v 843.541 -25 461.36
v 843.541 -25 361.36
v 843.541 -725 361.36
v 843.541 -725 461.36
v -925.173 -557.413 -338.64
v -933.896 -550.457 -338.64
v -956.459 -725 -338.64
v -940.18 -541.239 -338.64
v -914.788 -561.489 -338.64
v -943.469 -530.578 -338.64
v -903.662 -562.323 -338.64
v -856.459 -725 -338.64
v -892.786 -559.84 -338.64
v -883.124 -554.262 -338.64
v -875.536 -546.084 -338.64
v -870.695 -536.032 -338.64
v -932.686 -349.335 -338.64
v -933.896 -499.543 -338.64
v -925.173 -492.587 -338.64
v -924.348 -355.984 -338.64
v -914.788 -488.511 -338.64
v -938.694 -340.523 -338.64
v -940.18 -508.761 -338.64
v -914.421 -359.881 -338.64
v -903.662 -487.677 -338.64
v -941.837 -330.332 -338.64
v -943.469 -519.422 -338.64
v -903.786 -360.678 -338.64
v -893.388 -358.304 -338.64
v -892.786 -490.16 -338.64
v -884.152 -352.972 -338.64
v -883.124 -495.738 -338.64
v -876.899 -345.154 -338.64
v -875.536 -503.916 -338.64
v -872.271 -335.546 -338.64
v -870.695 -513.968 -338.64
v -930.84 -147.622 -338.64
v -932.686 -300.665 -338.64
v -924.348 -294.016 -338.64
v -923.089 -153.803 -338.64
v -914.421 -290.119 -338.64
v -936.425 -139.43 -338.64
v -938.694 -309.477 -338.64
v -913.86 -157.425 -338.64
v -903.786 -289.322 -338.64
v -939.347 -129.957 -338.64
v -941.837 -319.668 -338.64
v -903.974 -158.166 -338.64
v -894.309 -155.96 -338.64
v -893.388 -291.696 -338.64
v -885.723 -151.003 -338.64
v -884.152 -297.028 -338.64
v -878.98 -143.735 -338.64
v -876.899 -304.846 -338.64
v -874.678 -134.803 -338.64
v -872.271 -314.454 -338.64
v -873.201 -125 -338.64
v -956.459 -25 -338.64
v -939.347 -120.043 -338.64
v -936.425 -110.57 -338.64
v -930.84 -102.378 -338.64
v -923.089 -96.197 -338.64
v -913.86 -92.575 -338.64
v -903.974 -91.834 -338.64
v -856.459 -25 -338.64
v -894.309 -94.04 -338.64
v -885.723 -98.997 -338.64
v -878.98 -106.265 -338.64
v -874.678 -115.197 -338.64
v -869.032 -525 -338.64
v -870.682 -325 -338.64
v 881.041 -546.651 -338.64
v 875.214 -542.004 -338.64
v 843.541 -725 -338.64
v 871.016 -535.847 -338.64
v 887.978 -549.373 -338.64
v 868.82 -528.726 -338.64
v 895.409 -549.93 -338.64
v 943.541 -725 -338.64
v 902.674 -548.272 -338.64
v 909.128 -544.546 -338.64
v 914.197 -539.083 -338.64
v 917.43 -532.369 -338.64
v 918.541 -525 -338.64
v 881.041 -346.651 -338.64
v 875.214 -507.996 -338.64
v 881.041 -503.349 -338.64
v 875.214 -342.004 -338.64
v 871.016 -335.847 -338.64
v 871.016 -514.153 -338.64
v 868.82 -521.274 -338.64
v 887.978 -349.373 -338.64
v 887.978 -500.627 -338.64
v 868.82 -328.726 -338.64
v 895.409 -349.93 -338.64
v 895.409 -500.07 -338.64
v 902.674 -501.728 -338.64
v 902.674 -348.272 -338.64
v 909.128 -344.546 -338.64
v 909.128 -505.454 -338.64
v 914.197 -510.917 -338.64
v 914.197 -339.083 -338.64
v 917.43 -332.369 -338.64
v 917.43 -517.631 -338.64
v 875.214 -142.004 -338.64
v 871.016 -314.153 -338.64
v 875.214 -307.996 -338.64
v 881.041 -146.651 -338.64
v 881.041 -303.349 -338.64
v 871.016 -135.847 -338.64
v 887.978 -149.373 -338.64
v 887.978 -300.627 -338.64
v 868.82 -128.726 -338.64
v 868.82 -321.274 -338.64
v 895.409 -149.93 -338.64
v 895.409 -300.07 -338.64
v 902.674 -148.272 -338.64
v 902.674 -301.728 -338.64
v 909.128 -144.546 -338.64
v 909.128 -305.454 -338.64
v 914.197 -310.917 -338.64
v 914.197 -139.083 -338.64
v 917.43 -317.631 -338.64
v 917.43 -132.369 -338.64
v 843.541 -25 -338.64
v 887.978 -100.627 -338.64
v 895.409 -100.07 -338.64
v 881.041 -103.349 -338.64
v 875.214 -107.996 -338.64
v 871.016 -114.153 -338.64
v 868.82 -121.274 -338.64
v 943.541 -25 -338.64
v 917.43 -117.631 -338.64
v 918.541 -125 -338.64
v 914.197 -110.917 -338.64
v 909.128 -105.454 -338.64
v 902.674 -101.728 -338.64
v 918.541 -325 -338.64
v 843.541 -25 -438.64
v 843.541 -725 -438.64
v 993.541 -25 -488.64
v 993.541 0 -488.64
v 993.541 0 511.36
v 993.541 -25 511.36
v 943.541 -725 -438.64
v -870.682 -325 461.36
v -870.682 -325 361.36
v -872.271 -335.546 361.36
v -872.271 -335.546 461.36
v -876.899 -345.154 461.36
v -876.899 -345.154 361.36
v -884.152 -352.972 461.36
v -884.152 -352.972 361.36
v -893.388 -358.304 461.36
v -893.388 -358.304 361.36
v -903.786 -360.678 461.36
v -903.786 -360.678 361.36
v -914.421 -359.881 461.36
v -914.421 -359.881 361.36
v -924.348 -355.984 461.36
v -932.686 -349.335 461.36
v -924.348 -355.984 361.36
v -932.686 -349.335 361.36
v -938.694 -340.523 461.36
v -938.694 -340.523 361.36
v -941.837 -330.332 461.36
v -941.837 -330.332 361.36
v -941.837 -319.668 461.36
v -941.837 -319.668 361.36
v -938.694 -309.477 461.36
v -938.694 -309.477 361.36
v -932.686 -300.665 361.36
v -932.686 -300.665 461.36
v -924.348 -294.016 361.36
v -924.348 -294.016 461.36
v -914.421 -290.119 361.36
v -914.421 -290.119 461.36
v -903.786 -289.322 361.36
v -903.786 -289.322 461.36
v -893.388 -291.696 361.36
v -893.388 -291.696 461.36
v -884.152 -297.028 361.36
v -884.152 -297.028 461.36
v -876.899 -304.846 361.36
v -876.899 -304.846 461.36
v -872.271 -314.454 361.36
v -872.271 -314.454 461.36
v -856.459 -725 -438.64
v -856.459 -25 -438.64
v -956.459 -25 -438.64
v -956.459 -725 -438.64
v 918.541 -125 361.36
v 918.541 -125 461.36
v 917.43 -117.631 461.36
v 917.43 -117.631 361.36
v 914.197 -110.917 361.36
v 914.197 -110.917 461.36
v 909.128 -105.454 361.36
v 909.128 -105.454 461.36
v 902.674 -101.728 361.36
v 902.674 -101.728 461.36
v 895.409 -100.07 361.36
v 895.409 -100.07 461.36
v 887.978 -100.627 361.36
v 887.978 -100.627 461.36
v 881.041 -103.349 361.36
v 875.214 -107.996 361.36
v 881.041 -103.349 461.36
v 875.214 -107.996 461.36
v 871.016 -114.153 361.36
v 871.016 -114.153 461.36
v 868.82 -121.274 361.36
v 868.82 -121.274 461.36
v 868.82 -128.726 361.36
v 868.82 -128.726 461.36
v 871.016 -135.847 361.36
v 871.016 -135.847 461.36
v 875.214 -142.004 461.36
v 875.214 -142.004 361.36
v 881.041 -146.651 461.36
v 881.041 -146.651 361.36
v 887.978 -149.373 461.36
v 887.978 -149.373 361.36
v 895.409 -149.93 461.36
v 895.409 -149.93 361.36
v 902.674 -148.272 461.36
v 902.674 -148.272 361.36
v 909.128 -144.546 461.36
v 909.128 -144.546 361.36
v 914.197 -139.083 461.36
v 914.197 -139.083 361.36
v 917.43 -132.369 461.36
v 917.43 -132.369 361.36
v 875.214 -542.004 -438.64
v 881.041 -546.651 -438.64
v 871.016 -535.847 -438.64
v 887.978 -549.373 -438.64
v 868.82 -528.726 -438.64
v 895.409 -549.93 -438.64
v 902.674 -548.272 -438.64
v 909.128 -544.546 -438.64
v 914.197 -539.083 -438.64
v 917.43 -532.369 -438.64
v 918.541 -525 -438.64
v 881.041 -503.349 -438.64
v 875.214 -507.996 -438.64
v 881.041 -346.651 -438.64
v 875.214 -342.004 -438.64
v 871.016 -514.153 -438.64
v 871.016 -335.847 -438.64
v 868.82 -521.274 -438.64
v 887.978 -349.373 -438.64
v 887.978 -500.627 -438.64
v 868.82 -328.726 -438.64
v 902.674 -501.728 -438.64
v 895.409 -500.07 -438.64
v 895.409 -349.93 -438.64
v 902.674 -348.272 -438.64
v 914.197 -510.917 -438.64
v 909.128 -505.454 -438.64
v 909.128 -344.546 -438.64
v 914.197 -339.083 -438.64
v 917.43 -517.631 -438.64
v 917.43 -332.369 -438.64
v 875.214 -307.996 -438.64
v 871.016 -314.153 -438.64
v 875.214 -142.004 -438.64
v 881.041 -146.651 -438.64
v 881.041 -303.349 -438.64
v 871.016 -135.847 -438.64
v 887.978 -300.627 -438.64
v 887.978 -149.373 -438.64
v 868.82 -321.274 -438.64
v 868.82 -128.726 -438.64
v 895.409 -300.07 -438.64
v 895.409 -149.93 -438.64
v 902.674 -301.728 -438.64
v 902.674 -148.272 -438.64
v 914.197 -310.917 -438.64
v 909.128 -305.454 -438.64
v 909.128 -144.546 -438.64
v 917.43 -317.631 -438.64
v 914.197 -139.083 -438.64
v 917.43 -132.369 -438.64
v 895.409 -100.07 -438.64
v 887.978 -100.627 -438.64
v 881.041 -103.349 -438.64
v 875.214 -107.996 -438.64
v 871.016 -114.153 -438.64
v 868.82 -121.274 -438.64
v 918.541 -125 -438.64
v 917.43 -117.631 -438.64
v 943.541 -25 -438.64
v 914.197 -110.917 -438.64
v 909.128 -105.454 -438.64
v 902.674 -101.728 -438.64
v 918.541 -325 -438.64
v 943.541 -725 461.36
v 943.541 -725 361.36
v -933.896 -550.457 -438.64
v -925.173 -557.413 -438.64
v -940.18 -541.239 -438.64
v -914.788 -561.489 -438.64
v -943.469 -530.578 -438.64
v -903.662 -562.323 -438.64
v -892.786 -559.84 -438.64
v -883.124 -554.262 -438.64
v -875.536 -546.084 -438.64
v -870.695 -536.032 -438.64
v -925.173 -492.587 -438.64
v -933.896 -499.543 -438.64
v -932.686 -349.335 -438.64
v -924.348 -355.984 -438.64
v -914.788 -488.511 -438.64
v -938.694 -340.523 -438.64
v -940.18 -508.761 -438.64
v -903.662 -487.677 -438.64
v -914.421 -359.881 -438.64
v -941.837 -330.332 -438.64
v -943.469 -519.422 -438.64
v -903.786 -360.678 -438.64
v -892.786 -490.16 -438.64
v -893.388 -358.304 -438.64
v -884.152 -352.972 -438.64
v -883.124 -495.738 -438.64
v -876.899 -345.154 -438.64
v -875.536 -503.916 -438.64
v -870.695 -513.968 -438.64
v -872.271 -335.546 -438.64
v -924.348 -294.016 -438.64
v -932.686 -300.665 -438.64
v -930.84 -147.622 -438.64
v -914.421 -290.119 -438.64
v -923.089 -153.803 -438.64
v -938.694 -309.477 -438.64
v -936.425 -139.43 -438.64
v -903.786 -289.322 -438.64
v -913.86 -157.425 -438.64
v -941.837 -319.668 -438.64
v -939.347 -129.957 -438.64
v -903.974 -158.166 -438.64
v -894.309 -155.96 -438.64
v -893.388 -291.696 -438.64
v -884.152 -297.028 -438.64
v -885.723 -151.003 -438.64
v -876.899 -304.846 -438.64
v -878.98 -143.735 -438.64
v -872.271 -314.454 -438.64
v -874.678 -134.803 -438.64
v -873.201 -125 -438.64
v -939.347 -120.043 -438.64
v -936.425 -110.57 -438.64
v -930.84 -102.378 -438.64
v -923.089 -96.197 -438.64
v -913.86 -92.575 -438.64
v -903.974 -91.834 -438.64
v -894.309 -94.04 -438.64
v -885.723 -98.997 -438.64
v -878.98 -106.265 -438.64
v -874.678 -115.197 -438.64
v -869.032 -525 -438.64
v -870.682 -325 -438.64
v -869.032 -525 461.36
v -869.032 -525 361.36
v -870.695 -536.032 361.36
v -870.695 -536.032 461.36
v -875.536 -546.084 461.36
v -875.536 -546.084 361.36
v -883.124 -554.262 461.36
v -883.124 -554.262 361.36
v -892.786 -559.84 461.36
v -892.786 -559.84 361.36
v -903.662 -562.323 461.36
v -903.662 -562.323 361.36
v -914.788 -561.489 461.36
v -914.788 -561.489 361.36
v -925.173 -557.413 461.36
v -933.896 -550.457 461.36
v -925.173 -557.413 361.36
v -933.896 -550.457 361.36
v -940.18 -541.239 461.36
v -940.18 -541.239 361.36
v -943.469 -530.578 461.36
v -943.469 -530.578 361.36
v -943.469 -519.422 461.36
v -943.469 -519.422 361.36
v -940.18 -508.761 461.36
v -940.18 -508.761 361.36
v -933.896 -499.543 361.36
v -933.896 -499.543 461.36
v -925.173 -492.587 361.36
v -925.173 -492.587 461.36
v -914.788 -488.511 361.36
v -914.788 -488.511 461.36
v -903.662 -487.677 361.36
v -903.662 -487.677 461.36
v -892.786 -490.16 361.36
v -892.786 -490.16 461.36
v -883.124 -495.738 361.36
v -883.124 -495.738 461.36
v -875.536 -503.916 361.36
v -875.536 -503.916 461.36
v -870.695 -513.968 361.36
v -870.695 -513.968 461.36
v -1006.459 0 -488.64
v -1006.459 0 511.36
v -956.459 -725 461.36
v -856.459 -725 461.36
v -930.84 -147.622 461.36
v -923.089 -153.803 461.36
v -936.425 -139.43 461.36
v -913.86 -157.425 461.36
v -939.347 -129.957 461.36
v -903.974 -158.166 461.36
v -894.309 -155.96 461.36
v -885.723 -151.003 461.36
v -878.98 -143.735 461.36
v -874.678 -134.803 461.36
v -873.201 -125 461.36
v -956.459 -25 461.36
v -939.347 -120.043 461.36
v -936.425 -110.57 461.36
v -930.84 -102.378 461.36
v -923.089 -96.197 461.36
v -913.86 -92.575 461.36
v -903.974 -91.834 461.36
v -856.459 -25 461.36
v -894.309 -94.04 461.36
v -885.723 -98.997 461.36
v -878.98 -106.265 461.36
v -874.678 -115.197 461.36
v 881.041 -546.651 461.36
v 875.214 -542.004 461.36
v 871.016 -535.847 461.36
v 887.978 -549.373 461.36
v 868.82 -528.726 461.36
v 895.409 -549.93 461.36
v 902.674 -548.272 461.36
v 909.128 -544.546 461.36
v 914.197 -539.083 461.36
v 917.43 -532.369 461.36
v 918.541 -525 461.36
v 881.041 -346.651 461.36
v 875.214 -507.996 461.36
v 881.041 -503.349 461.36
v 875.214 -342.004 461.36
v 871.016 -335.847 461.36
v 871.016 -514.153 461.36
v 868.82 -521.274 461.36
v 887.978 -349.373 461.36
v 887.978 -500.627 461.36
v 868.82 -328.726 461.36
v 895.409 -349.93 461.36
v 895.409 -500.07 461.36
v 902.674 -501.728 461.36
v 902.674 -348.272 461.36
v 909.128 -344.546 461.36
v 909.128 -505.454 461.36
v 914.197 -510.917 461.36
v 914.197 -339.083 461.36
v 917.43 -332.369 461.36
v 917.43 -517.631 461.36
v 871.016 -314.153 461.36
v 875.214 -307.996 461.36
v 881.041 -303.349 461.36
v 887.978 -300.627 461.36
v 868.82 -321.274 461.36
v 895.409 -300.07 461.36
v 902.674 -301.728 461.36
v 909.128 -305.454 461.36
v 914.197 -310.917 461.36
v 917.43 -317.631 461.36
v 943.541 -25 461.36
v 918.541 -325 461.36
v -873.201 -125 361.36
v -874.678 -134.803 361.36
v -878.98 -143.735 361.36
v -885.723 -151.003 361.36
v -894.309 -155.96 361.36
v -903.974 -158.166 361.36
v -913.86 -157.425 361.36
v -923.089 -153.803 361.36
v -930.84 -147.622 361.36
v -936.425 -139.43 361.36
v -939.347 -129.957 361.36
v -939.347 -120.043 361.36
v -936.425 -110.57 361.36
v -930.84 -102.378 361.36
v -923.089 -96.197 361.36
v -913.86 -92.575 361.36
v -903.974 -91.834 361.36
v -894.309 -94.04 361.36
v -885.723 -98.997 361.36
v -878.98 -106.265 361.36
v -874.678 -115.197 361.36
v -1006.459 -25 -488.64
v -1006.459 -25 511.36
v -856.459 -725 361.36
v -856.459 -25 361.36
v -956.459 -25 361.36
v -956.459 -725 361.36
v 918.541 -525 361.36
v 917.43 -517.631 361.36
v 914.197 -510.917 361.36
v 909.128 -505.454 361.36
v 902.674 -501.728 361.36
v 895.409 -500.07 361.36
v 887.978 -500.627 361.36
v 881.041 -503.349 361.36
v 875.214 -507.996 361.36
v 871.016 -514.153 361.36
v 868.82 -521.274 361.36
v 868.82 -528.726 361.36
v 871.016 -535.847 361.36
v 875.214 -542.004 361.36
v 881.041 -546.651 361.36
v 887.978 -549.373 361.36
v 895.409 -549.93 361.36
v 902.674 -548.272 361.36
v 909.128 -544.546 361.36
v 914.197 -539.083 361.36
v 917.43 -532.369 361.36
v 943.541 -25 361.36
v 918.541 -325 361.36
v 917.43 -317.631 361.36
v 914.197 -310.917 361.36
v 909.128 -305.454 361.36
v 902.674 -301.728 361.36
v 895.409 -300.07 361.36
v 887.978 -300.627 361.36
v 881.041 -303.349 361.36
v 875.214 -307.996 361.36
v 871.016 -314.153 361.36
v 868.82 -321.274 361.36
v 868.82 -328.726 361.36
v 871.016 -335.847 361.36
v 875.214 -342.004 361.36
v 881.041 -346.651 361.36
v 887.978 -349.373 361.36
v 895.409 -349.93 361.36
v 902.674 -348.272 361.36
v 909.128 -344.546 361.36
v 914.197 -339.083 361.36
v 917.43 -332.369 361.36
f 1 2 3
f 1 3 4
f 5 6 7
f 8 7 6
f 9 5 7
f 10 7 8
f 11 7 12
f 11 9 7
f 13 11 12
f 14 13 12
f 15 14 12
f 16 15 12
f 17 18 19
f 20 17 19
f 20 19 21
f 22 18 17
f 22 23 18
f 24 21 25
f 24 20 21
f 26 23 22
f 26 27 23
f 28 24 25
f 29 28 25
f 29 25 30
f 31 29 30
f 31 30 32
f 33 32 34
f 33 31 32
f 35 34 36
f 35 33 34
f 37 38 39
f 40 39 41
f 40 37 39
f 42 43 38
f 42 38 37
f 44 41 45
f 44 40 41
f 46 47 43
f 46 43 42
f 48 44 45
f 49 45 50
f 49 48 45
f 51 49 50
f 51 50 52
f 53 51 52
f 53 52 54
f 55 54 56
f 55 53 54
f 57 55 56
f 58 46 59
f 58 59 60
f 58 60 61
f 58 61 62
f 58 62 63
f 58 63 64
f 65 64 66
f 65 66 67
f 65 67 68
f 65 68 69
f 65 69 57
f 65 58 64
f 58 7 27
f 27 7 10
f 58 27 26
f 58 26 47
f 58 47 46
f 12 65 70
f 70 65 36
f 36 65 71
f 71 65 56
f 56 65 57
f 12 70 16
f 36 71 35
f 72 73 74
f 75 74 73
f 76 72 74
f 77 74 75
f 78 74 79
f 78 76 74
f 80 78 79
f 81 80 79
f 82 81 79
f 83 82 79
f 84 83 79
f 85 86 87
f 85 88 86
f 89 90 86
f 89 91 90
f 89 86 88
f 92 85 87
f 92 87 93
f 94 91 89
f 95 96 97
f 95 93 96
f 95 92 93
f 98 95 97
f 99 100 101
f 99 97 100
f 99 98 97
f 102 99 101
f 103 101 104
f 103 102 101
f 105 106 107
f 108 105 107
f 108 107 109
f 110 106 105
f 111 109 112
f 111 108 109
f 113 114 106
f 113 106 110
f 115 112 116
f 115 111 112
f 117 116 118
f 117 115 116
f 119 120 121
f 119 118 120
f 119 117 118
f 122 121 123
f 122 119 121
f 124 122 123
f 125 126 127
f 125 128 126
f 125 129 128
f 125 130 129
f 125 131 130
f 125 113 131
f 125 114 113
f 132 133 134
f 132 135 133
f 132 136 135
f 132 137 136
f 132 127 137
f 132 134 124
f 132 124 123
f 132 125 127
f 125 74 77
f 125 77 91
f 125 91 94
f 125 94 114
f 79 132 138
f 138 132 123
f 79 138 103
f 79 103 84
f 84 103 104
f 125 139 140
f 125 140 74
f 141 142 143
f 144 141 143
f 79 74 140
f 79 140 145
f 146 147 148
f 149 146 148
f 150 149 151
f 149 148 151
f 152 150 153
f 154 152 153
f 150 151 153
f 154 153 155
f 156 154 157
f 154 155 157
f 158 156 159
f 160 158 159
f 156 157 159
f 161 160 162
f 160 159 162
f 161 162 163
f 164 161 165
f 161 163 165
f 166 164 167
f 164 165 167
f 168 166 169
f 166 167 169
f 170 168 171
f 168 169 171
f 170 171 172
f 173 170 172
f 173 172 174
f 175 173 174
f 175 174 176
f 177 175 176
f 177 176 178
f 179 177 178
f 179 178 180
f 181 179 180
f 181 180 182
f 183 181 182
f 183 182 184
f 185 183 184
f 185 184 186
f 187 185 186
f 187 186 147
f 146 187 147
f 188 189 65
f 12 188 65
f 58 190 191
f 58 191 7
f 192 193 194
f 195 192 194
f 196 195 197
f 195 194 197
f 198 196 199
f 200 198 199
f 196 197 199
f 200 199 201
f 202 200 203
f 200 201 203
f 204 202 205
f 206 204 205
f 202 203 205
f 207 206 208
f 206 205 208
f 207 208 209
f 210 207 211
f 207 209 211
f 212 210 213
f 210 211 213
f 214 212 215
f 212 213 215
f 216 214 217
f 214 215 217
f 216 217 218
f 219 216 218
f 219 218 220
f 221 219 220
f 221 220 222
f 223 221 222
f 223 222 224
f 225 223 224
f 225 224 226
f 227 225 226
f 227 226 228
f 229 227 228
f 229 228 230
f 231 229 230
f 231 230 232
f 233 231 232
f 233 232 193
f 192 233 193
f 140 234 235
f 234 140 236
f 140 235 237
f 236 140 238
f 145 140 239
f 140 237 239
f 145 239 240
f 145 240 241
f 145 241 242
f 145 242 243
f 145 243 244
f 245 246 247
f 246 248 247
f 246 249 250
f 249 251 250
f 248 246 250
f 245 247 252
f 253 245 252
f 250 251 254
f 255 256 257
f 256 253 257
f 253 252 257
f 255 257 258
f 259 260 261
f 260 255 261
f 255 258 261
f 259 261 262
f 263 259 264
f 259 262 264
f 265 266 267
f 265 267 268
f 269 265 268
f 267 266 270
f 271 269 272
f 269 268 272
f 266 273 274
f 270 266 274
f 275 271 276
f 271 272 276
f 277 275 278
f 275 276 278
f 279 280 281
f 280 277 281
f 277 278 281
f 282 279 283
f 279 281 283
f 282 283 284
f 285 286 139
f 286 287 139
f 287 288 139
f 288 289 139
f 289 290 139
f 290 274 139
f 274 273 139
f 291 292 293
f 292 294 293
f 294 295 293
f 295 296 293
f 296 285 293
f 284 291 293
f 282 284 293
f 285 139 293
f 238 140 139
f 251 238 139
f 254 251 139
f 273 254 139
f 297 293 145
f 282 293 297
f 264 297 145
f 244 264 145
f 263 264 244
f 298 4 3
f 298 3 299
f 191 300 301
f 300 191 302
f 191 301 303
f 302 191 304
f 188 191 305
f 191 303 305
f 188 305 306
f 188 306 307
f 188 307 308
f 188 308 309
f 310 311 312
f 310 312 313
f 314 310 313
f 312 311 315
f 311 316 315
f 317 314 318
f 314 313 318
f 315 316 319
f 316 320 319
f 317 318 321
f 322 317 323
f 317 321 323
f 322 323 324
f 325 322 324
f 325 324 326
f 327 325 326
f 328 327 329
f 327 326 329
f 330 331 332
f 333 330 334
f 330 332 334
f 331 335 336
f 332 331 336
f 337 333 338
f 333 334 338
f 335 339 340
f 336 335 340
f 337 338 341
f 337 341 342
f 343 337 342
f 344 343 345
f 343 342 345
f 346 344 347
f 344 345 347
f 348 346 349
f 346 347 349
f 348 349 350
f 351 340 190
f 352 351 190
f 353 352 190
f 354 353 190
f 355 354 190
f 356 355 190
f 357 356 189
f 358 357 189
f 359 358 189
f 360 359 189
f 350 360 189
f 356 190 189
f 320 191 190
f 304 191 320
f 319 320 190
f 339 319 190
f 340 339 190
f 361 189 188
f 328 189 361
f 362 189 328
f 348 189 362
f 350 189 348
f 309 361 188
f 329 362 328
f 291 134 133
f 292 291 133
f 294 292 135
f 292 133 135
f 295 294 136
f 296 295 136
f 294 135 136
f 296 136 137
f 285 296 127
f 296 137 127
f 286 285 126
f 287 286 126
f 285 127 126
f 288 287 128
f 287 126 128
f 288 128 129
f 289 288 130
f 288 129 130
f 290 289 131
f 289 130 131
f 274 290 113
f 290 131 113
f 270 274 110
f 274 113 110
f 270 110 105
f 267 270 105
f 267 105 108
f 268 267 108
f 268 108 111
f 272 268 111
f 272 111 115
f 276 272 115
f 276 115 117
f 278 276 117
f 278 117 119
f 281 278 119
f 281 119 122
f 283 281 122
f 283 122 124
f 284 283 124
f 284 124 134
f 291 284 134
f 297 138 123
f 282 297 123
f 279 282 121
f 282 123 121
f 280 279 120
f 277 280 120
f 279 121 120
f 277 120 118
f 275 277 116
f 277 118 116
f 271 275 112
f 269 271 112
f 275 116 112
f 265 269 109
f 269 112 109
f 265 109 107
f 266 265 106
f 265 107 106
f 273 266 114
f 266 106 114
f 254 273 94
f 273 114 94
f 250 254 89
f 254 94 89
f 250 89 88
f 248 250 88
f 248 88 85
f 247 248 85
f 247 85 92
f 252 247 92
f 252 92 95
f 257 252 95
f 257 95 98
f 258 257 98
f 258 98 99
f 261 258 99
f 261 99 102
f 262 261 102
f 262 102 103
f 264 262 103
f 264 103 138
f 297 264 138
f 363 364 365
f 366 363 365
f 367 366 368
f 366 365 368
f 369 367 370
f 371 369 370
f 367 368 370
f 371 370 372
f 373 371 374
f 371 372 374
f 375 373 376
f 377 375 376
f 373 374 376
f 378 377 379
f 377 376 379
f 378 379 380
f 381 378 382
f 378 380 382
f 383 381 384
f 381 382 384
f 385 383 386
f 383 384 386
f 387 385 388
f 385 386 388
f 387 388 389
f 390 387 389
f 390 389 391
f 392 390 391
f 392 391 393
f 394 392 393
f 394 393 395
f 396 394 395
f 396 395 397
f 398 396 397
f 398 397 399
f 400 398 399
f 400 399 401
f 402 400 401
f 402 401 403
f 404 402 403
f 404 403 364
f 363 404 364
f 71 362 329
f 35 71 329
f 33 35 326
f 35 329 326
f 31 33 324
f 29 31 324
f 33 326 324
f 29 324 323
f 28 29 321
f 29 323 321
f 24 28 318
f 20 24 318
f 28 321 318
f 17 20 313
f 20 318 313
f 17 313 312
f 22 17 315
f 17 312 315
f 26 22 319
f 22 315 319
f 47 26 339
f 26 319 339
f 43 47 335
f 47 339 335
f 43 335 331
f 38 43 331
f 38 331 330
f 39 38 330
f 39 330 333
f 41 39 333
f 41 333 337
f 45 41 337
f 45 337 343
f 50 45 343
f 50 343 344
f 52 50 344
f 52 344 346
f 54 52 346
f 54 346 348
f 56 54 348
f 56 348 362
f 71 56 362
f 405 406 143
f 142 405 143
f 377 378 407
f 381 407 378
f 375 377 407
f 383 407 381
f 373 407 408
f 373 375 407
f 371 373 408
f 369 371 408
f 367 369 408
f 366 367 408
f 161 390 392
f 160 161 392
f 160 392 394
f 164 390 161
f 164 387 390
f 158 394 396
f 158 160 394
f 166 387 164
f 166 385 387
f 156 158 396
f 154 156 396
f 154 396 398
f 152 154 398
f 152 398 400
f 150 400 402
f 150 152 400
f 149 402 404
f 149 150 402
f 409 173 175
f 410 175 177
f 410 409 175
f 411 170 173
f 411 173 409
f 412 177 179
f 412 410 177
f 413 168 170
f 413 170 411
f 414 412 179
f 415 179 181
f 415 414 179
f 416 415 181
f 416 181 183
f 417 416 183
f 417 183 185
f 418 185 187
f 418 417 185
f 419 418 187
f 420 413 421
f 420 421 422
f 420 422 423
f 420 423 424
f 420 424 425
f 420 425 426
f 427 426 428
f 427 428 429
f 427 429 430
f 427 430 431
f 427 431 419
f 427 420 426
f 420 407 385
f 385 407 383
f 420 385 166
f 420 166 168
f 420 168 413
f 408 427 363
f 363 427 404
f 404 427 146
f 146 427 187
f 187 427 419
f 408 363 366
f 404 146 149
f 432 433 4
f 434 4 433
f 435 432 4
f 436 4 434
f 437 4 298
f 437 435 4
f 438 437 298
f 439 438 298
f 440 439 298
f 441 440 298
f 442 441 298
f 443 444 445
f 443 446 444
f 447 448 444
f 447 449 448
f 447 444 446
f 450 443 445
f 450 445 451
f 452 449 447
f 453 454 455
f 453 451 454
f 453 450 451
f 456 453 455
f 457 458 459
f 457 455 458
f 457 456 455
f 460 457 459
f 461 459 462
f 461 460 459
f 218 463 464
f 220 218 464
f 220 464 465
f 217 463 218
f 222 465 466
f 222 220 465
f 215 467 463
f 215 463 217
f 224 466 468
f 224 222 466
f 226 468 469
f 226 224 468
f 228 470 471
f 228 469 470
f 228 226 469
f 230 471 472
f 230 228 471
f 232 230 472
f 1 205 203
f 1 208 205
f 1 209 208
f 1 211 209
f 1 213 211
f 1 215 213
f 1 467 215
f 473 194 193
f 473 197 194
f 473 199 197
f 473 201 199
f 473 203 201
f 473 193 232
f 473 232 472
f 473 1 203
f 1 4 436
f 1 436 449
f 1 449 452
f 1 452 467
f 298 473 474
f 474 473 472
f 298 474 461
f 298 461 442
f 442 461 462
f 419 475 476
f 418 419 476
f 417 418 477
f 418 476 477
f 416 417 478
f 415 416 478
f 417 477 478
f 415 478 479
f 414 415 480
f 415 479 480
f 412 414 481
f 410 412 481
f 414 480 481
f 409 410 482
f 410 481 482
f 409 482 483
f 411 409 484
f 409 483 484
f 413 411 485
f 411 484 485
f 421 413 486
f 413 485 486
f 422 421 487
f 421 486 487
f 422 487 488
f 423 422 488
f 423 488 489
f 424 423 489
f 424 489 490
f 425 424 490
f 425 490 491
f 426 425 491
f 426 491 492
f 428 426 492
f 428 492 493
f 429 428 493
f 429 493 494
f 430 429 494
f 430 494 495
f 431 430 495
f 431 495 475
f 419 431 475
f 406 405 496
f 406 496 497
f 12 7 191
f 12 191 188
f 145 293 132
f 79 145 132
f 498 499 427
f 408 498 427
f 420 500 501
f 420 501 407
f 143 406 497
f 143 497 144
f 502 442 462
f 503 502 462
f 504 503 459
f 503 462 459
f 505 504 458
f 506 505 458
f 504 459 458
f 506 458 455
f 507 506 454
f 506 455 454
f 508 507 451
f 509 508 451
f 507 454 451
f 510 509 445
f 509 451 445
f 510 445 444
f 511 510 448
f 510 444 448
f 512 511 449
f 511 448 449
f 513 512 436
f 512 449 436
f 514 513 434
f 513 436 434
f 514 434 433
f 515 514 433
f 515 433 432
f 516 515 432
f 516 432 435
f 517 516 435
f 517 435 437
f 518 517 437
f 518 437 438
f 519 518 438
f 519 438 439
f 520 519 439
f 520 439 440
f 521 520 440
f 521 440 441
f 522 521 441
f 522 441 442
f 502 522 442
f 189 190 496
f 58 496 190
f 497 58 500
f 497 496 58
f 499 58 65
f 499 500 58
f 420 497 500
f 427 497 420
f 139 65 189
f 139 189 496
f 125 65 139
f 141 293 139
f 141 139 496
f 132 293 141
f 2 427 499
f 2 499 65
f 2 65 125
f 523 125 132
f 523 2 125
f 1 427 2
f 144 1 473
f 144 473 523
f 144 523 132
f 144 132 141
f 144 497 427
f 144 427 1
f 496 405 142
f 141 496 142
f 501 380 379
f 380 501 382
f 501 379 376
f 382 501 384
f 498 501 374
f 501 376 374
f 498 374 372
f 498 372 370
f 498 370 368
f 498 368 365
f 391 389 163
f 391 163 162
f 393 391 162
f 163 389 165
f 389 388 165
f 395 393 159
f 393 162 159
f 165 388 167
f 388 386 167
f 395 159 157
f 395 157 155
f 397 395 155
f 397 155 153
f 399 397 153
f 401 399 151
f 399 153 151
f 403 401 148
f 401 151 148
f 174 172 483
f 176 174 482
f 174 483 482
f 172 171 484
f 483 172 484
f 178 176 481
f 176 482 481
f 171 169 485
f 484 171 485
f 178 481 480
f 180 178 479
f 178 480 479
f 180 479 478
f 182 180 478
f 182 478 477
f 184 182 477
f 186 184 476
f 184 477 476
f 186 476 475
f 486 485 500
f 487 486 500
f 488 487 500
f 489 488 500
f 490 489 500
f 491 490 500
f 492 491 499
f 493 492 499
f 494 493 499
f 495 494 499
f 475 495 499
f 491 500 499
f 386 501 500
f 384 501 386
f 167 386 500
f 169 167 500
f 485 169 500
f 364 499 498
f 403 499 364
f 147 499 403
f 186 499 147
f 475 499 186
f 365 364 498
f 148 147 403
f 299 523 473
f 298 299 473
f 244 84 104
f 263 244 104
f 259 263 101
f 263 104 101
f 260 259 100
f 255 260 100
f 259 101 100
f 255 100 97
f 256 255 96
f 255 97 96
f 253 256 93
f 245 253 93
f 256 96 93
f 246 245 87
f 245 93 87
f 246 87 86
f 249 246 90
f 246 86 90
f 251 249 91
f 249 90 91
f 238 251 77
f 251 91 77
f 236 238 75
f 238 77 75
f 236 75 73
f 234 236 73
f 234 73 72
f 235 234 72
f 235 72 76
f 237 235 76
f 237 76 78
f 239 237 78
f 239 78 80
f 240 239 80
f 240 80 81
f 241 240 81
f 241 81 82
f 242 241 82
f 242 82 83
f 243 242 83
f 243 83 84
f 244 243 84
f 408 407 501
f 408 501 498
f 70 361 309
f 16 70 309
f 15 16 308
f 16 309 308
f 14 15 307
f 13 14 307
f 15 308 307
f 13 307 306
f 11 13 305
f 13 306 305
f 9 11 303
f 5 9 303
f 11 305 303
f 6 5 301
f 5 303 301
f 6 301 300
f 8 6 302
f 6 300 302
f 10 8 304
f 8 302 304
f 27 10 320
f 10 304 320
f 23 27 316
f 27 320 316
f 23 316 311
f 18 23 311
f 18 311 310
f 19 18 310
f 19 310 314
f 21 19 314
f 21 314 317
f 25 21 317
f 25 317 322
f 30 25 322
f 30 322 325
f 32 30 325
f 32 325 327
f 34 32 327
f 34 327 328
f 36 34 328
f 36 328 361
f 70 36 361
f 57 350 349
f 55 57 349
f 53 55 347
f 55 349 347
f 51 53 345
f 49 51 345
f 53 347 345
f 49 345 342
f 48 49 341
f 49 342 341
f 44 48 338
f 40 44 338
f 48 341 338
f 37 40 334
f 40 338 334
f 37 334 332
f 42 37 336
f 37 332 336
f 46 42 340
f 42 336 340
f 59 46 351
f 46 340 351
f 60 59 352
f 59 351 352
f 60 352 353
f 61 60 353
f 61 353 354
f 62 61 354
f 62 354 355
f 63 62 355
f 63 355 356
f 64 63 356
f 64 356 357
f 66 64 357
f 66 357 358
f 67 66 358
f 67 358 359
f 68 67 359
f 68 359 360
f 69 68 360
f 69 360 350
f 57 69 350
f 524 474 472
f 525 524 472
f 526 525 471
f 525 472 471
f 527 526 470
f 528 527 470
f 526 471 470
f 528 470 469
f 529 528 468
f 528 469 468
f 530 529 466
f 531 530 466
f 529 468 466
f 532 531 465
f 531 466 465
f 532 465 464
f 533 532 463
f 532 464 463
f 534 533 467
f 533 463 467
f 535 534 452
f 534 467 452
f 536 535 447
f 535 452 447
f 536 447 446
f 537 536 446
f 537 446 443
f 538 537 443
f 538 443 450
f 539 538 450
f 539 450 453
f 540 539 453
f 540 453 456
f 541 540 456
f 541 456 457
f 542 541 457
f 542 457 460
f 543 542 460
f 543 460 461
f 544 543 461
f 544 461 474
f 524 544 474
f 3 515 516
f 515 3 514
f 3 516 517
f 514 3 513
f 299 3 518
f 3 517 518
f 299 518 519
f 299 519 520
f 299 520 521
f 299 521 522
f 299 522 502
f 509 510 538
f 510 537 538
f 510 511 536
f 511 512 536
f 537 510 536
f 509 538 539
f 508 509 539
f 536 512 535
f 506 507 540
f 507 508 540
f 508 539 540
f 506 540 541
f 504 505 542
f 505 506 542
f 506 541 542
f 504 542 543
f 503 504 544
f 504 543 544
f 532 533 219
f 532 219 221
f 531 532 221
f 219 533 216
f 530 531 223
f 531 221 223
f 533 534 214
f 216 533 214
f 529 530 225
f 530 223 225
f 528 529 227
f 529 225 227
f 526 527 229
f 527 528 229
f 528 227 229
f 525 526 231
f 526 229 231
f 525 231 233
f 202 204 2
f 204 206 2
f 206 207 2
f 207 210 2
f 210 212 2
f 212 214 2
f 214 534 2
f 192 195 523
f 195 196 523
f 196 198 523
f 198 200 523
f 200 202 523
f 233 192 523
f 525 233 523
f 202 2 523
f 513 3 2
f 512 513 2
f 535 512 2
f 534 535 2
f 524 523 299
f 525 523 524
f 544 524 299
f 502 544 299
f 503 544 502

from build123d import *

# Parameters (mm, degrees)
F0_W     = 2000
F0_H     = 1000
F0_W_2   = 100
F0_H_2   = 100
F1_DEPTH = 25
F2_DEPTH = 725
F3_R     = 33.258786
F3_R_2   = 35.777632
F3_R_3   = 37.427227
F4_DEPTH = 950.001
F5_R     = 25
F6_DEPTH = 950.001


with BuildPart() as f1:
    # F0 (on Front) → F1 (new body)
    with BuildSketch(Plane.XZ):
        with Locations((-6.459419, 11.359975)):
            Rectangle(F0_W, F0_H)
        with Locations((-906.459419, -388.640025)):
            Rectangle(F0_W_2, F0_H_2, mode=Mode.SUBTRACT)
        with Locations((893.540581, -388.640025)):
            Rectangle(F0_W_2, F0_H_2, mode=Mode.SUBTRACT)
        with Locations((-906.459419, 411.359975)):
            Rectangle(F0_W_2, F0_H_2, mode=Mode.SUBTRACT)
        with Locations((893.540581, 411.359975)):
            Rectangle(F0_W_2, F0_H_2, mode=Mode.SUBTRACT)
    extrude(amount=F1_DEPTH)

    # F0 (on Front) → F2 (join)
    with BuildSketch(Plane.XZ):
        with Locations((893.540581, -388.640025)):
            Rectangle(F0_W_2, F0_H_2)
        with Locations((-906.459419, -388.640025)):
            Rectangle(F0_W_2, F0_H_2)
        with Locations((-906.459419, 411.359975)):
            Rectangle(F0_W_2, F0_H_2)
        with Locations((893.540581, 411.359975)):
            Rectangle(F0_W_2, F0_H_2)
    extrude(amount=F2_DEPTH)

    # F3 (on face) → F4 (cut, through all)
    with BuildSketch(Plane(origin=(0, 0, -438.640025), x_dir=(1, 0, 0), z_dir=(0, 0, -1))):
        with Locations((-906.459419, 125)):
            Circle(F3_R)
        with Locations((-906.459419, 325)):
            Circle(F3_R_2)
        with Locations((-906.459419, 525)):
            Circle(F3_R_3)
    extrude(amount=-F4_DEPTH, mode=Mode.SUBTRACT)

    # F5 (on face) → F6 (cut, through all)
    with BuildSketch(Plane.XY.offset(461.359975)):
        with Locations((893.540581, -525)):
            Circle(F5_R)
        with Locations((893.540581, -325)):
            Circle(F5_R)
        with Locations((893.540581, -125)):
            Circle(F5_R)
    extrude(amount=-F6_DEPTH, mode=Mode.SUBTRACT)


solid = f1.part
